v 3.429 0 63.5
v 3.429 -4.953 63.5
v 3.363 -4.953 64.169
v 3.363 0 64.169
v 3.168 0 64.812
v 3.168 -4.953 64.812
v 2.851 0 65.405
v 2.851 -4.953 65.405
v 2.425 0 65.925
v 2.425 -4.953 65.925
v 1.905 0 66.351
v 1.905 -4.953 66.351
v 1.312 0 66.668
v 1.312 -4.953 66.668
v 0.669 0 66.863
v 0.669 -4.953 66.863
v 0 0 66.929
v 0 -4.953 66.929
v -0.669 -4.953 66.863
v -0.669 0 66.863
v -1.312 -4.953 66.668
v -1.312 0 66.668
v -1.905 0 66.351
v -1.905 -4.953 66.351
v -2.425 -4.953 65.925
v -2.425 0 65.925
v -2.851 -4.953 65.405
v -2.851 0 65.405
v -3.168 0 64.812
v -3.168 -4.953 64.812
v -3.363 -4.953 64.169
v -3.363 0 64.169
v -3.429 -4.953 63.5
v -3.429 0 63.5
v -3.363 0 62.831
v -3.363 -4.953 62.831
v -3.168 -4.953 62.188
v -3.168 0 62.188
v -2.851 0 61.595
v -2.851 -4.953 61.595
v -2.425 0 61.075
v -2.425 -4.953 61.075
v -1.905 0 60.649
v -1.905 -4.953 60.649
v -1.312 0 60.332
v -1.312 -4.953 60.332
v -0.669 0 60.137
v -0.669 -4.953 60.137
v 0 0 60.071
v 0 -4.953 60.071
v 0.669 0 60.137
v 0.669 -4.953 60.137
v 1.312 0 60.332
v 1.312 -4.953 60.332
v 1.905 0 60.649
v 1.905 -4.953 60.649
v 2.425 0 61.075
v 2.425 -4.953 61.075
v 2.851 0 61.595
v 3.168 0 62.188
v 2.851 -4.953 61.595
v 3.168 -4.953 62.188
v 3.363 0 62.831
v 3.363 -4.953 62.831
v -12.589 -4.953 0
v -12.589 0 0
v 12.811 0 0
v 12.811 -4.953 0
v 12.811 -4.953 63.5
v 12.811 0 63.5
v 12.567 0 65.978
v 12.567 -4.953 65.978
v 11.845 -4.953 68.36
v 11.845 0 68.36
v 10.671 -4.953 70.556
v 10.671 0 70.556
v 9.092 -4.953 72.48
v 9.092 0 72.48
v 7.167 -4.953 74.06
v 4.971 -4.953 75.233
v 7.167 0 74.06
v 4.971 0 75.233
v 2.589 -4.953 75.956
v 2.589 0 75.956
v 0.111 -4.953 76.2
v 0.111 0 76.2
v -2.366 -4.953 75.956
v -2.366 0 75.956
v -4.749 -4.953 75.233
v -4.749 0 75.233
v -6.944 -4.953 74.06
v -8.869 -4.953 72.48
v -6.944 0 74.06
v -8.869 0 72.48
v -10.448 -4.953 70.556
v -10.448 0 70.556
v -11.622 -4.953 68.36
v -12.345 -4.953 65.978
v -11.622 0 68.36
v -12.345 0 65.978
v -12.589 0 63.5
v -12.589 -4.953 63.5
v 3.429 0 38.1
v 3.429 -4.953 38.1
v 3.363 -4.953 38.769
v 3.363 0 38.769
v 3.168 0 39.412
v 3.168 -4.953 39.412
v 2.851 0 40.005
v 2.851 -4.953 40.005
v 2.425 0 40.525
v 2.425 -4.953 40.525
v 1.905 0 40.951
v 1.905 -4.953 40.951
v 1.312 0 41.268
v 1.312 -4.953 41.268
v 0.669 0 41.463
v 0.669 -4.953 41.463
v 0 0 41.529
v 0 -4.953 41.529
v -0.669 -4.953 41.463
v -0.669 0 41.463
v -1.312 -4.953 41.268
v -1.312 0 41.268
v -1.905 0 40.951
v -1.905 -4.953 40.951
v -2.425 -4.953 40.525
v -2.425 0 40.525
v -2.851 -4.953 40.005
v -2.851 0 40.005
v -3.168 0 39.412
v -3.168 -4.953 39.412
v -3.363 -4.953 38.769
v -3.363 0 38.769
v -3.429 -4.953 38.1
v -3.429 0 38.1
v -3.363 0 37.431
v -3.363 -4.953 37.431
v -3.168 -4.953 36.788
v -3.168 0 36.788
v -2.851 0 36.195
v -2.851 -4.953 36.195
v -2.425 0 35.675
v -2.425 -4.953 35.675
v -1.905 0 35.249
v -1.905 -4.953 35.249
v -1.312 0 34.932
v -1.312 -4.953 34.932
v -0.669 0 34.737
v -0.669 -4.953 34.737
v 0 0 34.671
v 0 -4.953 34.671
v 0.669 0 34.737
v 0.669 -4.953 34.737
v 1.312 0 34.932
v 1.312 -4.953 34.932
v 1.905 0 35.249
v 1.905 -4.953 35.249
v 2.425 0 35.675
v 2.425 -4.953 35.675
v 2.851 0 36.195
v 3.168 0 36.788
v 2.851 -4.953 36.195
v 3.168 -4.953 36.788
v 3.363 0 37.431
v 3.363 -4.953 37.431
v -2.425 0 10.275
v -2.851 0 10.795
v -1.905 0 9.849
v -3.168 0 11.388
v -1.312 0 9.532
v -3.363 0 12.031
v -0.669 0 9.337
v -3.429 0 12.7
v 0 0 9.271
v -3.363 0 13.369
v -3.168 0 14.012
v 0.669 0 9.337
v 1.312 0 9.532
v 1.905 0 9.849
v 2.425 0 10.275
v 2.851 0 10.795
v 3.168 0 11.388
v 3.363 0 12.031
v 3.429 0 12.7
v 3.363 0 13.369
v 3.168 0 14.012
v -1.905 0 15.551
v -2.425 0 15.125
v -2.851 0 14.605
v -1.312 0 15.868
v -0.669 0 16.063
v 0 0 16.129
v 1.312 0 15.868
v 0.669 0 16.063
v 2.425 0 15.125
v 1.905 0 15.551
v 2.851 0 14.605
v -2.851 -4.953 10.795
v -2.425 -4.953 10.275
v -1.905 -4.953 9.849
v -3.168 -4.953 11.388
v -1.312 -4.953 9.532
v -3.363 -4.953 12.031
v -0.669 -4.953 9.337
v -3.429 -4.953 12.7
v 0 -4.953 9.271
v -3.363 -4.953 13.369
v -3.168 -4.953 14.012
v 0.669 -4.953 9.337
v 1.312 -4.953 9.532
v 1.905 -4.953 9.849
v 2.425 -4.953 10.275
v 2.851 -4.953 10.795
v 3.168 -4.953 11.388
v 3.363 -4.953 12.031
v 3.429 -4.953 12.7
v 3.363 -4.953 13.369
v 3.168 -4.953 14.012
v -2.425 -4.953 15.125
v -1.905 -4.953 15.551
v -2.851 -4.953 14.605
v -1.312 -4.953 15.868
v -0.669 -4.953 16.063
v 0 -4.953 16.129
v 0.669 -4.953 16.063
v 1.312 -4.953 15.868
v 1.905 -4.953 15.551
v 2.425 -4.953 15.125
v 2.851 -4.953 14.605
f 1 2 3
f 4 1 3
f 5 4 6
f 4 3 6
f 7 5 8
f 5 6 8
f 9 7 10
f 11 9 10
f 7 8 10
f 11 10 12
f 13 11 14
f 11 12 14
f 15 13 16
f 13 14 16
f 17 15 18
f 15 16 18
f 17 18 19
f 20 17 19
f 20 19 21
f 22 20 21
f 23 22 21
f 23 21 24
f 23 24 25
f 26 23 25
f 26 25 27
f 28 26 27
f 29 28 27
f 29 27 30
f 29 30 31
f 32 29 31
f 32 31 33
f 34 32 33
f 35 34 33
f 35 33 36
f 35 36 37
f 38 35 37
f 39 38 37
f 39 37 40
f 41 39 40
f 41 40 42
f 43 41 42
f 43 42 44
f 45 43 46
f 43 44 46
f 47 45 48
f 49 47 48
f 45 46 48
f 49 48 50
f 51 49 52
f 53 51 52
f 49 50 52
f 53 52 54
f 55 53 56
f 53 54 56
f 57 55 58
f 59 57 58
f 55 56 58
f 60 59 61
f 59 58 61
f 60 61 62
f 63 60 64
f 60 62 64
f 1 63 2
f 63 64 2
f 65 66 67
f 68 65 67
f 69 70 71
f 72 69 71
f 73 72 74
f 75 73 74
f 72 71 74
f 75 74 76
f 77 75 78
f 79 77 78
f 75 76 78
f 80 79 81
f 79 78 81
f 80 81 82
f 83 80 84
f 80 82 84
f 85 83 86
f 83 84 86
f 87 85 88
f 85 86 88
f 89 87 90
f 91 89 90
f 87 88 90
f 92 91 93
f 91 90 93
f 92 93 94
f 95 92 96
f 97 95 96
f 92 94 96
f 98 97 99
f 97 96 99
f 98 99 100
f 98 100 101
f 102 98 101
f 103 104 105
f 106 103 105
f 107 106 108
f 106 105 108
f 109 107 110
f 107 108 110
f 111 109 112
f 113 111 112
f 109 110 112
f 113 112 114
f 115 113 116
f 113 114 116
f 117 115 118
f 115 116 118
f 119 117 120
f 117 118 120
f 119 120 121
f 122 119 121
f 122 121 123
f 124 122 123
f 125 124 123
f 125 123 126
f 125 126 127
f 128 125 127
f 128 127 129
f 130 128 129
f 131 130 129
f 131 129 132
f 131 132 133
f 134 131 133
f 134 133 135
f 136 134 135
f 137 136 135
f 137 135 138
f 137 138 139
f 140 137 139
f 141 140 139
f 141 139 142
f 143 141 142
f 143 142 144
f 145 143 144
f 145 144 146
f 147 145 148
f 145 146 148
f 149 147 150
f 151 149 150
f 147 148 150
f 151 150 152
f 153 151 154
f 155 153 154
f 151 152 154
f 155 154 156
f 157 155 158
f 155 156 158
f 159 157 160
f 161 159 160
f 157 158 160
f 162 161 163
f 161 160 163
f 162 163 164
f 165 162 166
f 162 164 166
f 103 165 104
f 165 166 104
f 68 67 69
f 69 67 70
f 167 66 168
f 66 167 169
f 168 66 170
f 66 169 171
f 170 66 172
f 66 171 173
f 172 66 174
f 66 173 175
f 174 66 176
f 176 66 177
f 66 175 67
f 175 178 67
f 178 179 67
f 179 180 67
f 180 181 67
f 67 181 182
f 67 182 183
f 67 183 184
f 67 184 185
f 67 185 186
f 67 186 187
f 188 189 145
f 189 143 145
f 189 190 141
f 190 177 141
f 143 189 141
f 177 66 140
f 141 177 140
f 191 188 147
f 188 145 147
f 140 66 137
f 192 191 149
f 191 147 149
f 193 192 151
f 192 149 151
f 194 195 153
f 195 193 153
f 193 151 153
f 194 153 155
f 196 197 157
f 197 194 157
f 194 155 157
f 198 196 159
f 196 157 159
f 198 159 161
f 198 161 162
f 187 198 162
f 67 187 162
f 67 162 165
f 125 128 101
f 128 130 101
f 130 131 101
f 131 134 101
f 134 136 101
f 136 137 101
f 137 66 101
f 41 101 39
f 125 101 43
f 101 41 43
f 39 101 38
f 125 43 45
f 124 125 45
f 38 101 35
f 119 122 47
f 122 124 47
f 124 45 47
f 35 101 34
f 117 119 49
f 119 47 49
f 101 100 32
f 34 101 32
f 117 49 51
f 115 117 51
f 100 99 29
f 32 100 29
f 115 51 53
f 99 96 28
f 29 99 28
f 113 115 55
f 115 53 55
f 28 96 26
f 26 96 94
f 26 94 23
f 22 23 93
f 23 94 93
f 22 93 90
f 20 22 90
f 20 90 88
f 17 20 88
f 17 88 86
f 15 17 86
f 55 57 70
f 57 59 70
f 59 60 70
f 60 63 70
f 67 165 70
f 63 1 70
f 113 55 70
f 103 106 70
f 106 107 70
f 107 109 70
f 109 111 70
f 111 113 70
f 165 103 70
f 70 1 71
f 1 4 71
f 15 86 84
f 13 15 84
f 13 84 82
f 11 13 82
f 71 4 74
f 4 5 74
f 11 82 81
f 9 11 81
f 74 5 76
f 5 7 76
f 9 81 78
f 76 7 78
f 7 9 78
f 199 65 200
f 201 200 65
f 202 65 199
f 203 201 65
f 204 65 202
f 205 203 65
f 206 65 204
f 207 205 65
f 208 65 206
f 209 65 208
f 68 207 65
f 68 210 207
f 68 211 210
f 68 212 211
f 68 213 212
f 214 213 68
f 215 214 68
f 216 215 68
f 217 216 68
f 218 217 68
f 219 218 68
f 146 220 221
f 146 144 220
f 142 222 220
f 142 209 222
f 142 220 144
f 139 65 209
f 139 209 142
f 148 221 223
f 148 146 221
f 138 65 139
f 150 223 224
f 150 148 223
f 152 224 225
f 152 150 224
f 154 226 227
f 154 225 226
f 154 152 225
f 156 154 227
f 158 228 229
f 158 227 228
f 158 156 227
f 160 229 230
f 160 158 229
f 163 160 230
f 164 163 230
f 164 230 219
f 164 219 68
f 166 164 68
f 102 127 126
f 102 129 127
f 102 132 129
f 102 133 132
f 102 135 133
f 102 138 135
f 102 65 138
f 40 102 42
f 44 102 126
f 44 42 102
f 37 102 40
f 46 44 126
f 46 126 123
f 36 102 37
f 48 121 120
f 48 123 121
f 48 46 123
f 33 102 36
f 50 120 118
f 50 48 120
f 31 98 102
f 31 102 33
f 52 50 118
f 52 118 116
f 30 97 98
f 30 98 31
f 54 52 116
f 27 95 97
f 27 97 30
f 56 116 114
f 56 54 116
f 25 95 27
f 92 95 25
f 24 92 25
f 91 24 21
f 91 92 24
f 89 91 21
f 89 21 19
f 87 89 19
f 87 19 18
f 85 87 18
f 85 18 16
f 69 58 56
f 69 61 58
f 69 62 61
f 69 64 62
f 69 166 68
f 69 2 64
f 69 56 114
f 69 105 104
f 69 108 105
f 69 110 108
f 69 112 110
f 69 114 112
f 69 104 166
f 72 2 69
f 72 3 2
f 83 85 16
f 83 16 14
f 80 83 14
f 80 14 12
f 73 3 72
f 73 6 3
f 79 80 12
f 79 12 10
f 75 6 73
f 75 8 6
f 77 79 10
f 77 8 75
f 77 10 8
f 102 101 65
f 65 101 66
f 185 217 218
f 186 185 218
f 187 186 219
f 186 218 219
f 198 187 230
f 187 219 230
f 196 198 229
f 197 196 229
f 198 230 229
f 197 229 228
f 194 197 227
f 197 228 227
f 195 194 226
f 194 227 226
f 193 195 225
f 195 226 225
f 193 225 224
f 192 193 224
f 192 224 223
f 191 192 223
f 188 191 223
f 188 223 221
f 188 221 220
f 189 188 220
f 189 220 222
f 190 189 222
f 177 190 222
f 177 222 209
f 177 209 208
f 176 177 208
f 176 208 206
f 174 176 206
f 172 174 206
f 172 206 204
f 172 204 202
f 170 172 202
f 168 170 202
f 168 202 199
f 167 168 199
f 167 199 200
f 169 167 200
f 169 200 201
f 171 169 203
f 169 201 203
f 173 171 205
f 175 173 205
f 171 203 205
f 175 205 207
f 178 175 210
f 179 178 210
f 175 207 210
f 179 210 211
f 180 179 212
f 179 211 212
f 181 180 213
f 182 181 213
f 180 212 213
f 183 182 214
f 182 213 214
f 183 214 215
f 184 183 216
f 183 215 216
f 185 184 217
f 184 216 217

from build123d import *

# Parameters (mm, degrees)
F1_DEPTH = 4.953
F2_R     = 3.429
F3_DEPTH = 25.4


with BuildPart() as f1:
    # F0 (on Front) → F1 (new body)
    with BuildSketch(Plane.XZ):
        with BuildLine():
            Line((-12.5887309267, 0), (12.8112690733, 0))
            Line((12.8112690733, 0), (12.8112690733, 63.5))
            ThreePointArc((12.8112690733, 63.5), (0.1112690733, 50.8), (-12.5887309267, 63.5))
            Line((-12.5887309267, 63.5), (-12.5887309267, 0))
        make_face()
        with BuildLine():
            ThreePointArc((-12.5887309267, 63.5), (0.1112690733, 50.8), (12.8112690733, 63.5))
            Line((12.8112690733, 63.5), (-12.5887309267, 63.5))
        make_face()
        with BuildLine():
            Line((-12.5887309267, 63.5), (12.8112690733, 63.5))
            ThreePointArc((12.8112690733, 63.5), (0.1112690733, 76.2), (-12.5887309267, 63.5))
        make_face()
    extrude(amount=F1_DEPTH)

    # F2 (on face) → F3 (cut)
    with BuildSketch(Plane.XZ.offset(4.953)):
        with Locations((0, 12.7)):
            Circle(F2_R)
        with Locations((0, 38.1)):
            Circle(F2_R)
        with Locations((0, 63.5)):
            Circle(F2_R)
    extrude(amount=-F3_DEPTH, mode=Mode.SUBTRACT)


solid = f1.part
